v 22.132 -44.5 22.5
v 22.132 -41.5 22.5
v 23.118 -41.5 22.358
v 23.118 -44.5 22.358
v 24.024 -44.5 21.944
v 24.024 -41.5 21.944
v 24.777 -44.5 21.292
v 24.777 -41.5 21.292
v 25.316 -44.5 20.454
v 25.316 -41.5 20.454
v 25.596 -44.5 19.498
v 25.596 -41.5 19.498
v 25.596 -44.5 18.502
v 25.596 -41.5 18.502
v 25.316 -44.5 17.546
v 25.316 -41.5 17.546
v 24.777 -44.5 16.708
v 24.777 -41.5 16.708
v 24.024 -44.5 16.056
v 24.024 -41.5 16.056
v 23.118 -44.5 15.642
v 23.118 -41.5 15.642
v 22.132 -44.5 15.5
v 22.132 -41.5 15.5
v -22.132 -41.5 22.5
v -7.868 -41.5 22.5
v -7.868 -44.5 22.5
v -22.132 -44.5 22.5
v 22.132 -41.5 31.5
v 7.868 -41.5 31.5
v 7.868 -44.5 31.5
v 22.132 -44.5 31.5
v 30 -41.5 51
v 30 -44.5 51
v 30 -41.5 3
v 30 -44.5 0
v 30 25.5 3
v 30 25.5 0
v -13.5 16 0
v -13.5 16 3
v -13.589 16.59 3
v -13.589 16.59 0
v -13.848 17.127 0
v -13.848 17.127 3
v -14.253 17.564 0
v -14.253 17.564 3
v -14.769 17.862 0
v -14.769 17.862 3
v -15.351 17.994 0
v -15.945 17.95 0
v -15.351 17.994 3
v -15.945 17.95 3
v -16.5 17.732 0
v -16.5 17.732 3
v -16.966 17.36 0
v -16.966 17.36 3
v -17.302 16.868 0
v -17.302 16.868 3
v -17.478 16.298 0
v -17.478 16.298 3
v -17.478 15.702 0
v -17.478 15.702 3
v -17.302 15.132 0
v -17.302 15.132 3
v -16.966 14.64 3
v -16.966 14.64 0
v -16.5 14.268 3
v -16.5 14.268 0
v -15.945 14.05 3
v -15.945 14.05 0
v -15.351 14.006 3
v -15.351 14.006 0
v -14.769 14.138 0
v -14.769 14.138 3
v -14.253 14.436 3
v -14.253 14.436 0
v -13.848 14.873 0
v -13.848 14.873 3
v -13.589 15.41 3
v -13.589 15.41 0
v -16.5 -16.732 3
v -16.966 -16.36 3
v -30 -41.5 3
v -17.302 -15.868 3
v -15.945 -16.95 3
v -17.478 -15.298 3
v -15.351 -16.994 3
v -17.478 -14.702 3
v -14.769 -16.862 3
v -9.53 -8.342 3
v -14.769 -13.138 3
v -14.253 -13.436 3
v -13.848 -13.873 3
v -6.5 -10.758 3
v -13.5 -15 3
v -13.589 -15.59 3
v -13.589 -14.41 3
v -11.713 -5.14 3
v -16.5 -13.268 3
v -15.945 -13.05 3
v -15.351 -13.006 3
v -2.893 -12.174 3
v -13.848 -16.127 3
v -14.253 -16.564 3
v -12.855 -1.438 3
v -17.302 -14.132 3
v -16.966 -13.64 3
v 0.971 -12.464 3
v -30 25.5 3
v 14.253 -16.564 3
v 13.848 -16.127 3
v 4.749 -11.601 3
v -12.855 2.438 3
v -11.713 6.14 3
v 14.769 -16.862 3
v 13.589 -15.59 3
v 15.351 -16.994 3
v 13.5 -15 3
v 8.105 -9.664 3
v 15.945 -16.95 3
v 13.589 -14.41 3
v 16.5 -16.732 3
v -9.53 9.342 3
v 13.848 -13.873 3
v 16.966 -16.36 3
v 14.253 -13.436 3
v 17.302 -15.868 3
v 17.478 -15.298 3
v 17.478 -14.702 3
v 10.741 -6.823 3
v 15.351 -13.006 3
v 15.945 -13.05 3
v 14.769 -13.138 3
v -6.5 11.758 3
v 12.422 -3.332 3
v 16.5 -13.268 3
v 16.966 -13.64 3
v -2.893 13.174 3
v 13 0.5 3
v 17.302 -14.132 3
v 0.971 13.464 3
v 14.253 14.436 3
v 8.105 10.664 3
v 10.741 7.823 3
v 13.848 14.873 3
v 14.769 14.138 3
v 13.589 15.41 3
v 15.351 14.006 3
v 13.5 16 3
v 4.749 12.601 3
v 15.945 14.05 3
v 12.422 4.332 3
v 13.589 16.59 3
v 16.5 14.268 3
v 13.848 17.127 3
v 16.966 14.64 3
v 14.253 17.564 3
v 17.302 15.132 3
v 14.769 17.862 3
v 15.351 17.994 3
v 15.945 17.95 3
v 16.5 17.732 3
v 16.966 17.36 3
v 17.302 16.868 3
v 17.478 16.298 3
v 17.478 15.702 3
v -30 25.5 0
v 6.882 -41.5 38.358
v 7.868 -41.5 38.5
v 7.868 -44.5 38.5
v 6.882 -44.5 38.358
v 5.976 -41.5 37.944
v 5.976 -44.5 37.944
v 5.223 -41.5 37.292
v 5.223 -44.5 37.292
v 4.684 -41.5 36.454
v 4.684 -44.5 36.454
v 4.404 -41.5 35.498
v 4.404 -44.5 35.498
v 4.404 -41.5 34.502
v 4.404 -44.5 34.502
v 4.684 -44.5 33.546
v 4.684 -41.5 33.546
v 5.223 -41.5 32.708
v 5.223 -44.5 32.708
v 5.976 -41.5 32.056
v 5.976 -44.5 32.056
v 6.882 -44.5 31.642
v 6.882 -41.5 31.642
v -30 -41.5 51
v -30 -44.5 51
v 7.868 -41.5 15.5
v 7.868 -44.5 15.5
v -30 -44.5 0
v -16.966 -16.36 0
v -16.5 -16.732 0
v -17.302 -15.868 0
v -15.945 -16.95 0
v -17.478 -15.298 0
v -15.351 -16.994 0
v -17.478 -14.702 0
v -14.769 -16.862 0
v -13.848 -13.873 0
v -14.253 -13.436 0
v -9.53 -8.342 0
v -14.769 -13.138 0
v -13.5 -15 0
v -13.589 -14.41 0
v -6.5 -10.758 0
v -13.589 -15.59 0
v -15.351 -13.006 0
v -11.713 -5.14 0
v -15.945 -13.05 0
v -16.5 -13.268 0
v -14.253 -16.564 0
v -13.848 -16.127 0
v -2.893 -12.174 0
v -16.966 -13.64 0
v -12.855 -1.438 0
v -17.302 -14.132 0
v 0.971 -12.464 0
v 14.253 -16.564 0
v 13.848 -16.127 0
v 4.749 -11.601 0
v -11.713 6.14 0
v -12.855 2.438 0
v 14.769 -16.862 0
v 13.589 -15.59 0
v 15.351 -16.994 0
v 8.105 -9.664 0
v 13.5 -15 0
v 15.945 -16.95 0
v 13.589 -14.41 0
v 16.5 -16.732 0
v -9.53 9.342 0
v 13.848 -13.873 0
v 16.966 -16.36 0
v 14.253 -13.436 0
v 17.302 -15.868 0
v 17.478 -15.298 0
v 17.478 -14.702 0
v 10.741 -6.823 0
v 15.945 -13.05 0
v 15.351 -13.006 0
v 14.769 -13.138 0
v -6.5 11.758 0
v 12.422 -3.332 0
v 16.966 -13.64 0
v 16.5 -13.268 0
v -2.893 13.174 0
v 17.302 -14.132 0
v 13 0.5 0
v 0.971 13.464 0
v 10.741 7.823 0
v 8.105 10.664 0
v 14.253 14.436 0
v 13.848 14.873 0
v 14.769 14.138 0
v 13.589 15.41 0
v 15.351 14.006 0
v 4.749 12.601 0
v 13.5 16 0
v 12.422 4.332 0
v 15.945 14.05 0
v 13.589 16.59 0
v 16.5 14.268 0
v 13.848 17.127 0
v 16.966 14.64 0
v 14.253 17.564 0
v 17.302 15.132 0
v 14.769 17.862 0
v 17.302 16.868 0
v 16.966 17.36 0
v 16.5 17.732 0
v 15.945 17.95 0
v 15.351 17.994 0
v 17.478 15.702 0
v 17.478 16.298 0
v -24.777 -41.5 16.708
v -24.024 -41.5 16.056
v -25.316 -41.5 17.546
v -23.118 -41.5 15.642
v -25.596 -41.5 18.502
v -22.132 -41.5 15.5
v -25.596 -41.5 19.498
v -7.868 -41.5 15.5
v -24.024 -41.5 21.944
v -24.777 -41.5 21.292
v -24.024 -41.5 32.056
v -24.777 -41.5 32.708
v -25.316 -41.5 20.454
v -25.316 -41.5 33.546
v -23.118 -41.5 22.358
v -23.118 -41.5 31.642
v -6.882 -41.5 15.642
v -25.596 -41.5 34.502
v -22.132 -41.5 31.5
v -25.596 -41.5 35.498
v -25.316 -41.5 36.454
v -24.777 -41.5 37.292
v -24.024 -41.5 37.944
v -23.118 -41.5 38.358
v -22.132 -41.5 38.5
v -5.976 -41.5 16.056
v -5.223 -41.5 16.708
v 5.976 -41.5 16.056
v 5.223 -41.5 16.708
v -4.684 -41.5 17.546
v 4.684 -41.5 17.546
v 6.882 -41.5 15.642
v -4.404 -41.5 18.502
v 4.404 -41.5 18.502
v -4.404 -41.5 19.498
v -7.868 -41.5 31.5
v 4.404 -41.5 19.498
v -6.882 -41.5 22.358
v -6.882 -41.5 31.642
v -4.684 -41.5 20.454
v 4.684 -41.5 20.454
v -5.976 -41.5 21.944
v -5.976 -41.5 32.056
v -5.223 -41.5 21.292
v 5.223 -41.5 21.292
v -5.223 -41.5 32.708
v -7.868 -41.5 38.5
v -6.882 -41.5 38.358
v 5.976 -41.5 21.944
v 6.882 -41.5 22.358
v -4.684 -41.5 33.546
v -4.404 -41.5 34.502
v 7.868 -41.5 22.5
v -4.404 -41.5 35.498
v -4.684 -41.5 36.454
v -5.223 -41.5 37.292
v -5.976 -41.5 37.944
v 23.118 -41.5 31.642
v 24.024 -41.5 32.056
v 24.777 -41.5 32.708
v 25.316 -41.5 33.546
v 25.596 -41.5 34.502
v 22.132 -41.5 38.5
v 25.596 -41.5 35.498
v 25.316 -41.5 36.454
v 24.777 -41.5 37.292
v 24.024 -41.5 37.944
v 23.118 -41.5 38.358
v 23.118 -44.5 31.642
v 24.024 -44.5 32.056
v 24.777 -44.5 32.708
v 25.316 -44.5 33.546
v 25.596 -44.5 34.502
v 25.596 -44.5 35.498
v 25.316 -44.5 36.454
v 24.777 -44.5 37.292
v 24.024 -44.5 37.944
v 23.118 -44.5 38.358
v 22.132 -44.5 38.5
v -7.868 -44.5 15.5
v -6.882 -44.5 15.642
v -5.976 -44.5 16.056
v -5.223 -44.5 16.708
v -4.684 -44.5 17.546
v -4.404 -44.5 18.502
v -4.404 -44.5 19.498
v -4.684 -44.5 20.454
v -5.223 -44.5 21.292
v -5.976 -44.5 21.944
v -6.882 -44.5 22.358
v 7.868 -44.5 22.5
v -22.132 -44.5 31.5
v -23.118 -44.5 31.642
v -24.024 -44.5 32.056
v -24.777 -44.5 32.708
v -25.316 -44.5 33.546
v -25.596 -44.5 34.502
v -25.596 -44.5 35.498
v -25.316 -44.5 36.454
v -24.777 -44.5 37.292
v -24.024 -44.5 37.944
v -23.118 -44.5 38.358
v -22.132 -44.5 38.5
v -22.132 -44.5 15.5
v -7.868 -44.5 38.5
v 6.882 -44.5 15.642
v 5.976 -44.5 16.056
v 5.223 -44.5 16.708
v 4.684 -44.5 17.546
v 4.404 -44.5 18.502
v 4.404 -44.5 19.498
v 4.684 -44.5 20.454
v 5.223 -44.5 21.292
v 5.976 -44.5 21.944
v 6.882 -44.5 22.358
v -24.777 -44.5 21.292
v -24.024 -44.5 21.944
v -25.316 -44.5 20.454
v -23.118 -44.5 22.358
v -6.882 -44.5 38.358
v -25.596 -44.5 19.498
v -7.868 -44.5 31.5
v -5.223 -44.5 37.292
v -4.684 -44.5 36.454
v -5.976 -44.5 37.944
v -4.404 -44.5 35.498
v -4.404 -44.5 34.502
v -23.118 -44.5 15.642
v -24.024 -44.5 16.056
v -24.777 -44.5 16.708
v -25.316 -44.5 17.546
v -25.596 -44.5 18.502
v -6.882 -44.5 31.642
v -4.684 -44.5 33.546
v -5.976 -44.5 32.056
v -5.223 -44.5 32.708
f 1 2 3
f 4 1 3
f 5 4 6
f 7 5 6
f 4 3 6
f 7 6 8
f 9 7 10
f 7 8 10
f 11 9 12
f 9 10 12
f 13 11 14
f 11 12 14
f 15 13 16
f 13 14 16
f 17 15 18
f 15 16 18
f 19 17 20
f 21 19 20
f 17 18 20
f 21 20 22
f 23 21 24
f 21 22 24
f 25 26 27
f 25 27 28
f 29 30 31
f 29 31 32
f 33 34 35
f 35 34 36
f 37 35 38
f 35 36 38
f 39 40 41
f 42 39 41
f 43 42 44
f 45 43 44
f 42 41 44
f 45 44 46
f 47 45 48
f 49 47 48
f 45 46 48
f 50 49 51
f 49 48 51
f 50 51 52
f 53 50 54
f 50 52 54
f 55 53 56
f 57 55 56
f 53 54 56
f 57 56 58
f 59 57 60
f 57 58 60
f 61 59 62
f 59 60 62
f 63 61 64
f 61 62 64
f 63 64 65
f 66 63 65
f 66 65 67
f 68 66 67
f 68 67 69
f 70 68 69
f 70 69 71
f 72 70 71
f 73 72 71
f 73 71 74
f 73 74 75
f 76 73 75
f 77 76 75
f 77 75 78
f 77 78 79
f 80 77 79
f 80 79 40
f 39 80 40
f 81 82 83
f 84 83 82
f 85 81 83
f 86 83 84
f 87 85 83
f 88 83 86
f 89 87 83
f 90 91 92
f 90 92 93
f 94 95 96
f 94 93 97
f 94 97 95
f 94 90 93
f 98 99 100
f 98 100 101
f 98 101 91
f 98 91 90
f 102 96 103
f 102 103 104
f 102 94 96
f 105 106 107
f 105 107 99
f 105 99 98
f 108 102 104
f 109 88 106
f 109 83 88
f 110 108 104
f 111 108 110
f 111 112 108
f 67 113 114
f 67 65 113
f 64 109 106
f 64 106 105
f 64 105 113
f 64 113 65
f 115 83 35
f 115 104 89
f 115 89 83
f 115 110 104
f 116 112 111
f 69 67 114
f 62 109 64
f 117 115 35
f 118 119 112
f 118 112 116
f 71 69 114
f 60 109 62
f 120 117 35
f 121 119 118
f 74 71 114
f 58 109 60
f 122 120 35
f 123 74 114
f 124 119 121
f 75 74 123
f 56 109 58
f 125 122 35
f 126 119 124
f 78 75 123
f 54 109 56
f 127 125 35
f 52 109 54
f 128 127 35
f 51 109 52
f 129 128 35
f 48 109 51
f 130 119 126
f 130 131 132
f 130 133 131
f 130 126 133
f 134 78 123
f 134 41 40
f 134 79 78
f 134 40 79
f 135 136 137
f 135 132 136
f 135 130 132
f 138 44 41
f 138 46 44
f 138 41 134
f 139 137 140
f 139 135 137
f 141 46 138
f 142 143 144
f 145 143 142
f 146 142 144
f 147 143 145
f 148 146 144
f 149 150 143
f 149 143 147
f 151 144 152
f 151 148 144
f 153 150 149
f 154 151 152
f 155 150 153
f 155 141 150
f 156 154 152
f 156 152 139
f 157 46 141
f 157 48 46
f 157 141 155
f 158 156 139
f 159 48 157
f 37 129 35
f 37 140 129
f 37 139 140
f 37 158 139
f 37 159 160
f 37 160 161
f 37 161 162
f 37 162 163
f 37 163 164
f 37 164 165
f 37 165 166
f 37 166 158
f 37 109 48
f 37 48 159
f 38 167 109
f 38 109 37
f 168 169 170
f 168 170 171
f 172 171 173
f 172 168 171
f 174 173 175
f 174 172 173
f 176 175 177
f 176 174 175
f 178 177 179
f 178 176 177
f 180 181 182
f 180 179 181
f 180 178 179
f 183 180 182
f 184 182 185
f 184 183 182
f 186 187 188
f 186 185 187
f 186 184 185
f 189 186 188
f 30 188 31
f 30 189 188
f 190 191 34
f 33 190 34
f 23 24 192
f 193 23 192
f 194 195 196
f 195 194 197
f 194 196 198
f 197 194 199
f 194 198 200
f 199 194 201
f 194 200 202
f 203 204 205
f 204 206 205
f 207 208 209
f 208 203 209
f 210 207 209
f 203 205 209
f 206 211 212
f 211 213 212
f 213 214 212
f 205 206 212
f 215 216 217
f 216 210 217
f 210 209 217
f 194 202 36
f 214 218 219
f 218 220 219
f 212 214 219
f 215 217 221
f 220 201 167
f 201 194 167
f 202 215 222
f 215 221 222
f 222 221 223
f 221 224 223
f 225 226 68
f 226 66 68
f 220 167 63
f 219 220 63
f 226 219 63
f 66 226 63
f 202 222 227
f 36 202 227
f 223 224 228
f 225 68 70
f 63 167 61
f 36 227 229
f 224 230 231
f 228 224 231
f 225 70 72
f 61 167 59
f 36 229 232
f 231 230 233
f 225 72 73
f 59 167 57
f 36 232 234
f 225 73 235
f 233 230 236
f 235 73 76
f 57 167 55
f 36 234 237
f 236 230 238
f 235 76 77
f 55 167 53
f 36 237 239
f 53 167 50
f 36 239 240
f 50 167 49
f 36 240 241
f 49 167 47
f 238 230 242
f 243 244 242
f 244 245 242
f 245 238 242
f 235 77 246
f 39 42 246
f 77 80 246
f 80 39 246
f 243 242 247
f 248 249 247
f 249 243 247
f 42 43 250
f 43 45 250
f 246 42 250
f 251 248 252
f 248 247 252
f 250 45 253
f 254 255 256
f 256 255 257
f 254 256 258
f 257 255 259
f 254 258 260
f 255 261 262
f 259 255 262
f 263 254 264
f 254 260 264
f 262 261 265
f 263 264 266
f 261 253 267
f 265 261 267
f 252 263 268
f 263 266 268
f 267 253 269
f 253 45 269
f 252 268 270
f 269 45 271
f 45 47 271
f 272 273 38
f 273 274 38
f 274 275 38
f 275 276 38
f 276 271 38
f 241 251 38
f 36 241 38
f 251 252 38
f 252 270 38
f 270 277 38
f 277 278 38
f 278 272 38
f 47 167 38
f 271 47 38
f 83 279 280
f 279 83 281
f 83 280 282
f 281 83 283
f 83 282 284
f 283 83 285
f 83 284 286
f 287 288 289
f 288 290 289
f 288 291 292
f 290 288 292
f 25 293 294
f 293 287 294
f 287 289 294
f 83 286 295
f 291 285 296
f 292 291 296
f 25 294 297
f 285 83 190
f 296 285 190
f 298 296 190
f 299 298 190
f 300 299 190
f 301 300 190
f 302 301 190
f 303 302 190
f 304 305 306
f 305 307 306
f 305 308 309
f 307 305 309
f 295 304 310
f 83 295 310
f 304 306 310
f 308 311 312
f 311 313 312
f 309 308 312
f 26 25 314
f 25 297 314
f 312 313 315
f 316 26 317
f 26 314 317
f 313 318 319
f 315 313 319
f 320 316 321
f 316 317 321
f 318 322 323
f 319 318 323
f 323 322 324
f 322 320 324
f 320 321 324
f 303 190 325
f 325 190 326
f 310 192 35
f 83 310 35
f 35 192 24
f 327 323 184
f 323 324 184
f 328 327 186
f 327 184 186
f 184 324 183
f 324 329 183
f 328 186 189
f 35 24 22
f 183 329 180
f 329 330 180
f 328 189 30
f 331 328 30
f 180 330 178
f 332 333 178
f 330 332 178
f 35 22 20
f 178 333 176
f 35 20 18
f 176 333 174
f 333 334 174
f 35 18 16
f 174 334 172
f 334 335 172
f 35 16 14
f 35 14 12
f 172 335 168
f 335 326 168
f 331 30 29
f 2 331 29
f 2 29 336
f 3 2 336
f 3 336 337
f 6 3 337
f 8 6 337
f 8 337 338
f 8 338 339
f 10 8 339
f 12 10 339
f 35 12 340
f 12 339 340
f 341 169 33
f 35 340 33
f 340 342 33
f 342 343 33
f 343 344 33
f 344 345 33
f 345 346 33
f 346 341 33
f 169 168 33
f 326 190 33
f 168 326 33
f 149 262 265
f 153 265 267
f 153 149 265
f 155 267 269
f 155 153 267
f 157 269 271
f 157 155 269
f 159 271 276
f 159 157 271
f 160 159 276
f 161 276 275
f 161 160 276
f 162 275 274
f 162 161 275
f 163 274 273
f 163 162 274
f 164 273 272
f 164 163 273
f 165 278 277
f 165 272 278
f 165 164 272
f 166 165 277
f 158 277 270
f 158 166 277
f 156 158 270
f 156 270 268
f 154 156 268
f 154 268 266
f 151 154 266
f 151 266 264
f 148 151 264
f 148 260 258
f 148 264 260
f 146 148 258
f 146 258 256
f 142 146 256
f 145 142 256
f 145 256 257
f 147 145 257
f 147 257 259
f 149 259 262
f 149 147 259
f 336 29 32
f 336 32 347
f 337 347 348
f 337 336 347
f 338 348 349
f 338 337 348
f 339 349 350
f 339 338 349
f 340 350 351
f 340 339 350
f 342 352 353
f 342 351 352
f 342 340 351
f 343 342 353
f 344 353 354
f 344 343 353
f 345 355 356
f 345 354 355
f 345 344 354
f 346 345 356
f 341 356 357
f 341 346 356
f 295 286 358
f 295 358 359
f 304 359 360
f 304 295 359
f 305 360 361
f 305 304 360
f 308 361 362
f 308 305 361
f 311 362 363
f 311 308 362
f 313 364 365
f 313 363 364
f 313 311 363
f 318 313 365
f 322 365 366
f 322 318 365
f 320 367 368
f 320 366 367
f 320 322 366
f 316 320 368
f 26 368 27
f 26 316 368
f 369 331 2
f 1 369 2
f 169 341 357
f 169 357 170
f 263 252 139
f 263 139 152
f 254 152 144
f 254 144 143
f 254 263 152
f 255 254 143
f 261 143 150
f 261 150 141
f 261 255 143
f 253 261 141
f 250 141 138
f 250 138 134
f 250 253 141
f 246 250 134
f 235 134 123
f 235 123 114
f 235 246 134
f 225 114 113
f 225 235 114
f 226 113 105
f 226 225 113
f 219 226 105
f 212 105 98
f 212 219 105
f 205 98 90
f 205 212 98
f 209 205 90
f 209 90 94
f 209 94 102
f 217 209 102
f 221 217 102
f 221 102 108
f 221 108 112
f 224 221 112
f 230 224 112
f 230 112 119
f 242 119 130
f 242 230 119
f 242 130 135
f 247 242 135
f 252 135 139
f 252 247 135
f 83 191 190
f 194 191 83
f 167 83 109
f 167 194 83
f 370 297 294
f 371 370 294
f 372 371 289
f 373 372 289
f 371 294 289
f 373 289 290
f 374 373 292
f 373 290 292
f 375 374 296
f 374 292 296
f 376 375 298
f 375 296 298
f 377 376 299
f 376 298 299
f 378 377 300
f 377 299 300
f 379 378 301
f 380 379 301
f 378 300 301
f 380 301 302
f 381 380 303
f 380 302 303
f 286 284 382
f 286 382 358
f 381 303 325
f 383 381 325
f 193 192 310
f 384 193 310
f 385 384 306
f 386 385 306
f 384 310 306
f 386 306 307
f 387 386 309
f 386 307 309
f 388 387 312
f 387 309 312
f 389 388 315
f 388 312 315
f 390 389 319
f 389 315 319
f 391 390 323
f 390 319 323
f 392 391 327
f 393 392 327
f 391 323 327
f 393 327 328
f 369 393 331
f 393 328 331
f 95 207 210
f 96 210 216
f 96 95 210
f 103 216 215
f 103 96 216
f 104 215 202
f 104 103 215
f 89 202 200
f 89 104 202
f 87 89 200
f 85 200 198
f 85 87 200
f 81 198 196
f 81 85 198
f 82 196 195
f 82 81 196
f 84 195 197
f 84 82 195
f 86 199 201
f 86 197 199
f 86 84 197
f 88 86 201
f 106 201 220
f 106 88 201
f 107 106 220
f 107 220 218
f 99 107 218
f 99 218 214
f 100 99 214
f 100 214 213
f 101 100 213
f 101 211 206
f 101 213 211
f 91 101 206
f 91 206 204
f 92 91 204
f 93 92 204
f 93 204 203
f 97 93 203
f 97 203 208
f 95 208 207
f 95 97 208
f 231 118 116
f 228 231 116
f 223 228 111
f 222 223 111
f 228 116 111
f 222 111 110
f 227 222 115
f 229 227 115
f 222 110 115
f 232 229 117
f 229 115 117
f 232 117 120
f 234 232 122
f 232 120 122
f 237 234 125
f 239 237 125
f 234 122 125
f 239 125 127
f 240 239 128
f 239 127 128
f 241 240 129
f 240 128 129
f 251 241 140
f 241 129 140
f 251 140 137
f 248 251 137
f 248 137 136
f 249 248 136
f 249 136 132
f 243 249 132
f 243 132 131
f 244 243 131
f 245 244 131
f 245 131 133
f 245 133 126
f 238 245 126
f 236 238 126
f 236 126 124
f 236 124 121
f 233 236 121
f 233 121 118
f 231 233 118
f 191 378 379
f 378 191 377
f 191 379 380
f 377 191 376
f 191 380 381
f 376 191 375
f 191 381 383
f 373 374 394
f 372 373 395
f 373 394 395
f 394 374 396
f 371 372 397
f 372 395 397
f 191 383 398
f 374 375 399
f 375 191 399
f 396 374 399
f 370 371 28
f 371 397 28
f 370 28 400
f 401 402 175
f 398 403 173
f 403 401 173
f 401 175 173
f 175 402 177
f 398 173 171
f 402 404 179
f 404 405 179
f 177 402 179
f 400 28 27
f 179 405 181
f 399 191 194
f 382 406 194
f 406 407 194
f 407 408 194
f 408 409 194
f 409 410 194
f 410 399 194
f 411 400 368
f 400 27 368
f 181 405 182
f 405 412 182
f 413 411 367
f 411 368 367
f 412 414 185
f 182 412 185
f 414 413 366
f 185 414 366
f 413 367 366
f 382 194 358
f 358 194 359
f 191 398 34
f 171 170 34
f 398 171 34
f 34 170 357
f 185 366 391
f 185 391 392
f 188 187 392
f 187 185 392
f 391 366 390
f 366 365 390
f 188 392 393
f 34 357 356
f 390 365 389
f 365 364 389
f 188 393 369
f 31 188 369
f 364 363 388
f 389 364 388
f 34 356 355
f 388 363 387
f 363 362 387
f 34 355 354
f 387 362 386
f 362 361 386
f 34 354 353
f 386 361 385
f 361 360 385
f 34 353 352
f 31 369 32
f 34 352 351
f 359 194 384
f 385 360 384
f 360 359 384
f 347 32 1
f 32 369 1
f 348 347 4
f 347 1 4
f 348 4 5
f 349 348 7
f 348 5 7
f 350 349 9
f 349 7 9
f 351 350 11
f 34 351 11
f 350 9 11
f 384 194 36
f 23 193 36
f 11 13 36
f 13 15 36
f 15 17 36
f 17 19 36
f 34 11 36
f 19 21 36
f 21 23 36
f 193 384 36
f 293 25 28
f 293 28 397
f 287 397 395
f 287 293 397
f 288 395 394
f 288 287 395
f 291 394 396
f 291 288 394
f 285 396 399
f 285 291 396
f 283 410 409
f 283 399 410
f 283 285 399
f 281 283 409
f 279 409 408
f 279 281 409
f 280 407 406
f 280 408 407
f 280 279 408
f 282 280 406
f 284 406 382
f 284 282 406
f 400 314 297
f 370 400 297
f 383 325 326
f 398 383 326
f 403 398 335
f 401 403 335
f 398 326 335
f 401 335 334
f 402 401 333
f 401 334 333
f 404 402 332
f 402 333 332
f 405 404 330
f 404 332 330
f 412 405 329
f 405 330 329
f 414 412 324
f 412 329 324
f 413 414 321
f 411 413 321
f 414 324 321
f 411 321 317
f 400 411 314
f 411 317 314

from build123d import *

# Parameters (mm, degrees)
SKETCH_1_W               = 60
SKETCH_1_H               = 70
SKETCH_1_R               = 13
EXTRUDE_1_DEPTH          = 3
SKETCH_2_W               = 60
SKETCH_2_H               = 51
EXTRUDE_2_DEPTH          = 3
SKETCH_3_R               = 2
CUT_EXTRUDE_1_DEPTH      = 10
MIRROR_3_COPY_1_SKETCH_R = 2
MIRROR_3_COPY_1_DEPTH    = 10
CUT_EXTRUDE_2_DEPTH      = 10
MIRROR_5_COPY_1_DEPTH    = 10


with BuildPart() as part:
    # 草图1 → 凸台-拉伸1 (new body)
    with BuildSketch(Plane.XY):
        with Locations((0, -9.5)):
            Rectangle(SKETCH_1_W, SKETCH_1_H)
        with Locations((0, 0.5)):
            Circle(SKETCH_1_R, mode=Mode.SUBTRACT)
    extrude(amount=EXTRUDE_1_DEPTH)

    # 草图2 → 凸台-拉伸2 (add)
    with BuildSketch(Plane.XZ.offset(44.5)):
        with Locations((0, 25.5)):
            Rectangle(SKETCH_2_W, SKETCH_2_H)
    extrude(amount=-EXTRUDE_2_DEPTH)

    # 草图3 → 切除-拉伸1 (cut)
    with BuildSketch(Plane.XY.offset(3)):
        with Locations((-15.5, 16)):
            Circle(SKETCH_3_R)
    cut_extrude_1 = extrude(amount=-CUT_EXTRUDE_1_DEPTH, mode=Mode.SUBTRACT)

    # 镜向1: 切除-拉伸1 across plane
    add(cut_extrude_1.mirror(Plane(origin=(0, 0, 0), x_dir=(0, 0, 1), z_dir=(1, 0, 0))), mode=Mode.SUBTRACT)

    # 镜向3: 切除-拉伸1 across plane
    add(cut_extrude_1.mirror(Plane.ZX.offset(0.5)), mode=Mode.SUBTRACT)

    # 镜向3 copy 1 sketch → 镜向3 copy 1 (cut)
    with BuildSketch(Plane(origin=(0, 1, 3), x_dir=(-1, 0, 0), z_dir=(0, 0, 1))):
        with Locations((-15.5, 16)):
            Circle(MIRROR_3_COPY_1_SKETCH_R)
    extrude(amount=-MIRROR_3_COPY_1_DEPTH, mode=Mode.SUBTRACT)

    # 草图4 → 切除-拉伸2 (cut)
    with BuildSketch(Plane(origin=(0, -41.5, 0), x_dir=(1, 0, 0), z_dir=(0, 1, 0))):
        with BuildLine():
            Line((-22.132037459, -15.5), (-7.867962541, -15.5))
            ThreePointArc((-7.867962541, -15.5), (-4.367962541, -19), (-7.867962541, -22.5))
            Line((-7.867962541, -22.5), (-22.132037459, -22.5))
            ThreePointArc((-22.132037459, -22.5), (-25.632037459, -19), (-22.132037459, -15.5))
        make_face()
    cut_extrude_2 = extrude(amount=-CUT_EXTRUDE_2_DEPTH, mode=Mode.SUBTRACT)

    # 镜向4: 切除-拉伸2 across plane
    add(cut_extrude_2.mirror(Plane.XY.offset(27)), mode=Mode.SUBTRACT)

    # 镜向5: 切除-拉伸2 across plane
    add(cut_extrude_2.mirror(Plane(origin=(0, 0, 0), x_dir=(0, 0, 1), z_dir=(1, 0, 0))), mode=Mode.SUBTRACT)

    # 镜向5 copy 1 sketch → 镜向5 copy 1 (cut)
    with BuildSketch(Plane(origin=(0, -41.5, 54), x_dir=(-1, 0, 0), z_dir=(0, 1, 0))):
        with BuildLine():
            Line((-22.132037459, -15.5), (-7.867962541, -15.5))
            ThreePointArc((-7.867962541, -15.5), (-4.367962541, -19), (-7.867962541, -22.5))
            Line((-7.867962541, -22.5), (-22.132037459, -22.5))
            ThreePointArc((-22.132037459, -22.5), (-25.632037459, -19), (-22.132037459, -15.5))
        make_face()
    extrude(amount=-MIRROR_5_COPY_1_DEPTH, mode=Mode.SUBTRACT)


solid = part.part
